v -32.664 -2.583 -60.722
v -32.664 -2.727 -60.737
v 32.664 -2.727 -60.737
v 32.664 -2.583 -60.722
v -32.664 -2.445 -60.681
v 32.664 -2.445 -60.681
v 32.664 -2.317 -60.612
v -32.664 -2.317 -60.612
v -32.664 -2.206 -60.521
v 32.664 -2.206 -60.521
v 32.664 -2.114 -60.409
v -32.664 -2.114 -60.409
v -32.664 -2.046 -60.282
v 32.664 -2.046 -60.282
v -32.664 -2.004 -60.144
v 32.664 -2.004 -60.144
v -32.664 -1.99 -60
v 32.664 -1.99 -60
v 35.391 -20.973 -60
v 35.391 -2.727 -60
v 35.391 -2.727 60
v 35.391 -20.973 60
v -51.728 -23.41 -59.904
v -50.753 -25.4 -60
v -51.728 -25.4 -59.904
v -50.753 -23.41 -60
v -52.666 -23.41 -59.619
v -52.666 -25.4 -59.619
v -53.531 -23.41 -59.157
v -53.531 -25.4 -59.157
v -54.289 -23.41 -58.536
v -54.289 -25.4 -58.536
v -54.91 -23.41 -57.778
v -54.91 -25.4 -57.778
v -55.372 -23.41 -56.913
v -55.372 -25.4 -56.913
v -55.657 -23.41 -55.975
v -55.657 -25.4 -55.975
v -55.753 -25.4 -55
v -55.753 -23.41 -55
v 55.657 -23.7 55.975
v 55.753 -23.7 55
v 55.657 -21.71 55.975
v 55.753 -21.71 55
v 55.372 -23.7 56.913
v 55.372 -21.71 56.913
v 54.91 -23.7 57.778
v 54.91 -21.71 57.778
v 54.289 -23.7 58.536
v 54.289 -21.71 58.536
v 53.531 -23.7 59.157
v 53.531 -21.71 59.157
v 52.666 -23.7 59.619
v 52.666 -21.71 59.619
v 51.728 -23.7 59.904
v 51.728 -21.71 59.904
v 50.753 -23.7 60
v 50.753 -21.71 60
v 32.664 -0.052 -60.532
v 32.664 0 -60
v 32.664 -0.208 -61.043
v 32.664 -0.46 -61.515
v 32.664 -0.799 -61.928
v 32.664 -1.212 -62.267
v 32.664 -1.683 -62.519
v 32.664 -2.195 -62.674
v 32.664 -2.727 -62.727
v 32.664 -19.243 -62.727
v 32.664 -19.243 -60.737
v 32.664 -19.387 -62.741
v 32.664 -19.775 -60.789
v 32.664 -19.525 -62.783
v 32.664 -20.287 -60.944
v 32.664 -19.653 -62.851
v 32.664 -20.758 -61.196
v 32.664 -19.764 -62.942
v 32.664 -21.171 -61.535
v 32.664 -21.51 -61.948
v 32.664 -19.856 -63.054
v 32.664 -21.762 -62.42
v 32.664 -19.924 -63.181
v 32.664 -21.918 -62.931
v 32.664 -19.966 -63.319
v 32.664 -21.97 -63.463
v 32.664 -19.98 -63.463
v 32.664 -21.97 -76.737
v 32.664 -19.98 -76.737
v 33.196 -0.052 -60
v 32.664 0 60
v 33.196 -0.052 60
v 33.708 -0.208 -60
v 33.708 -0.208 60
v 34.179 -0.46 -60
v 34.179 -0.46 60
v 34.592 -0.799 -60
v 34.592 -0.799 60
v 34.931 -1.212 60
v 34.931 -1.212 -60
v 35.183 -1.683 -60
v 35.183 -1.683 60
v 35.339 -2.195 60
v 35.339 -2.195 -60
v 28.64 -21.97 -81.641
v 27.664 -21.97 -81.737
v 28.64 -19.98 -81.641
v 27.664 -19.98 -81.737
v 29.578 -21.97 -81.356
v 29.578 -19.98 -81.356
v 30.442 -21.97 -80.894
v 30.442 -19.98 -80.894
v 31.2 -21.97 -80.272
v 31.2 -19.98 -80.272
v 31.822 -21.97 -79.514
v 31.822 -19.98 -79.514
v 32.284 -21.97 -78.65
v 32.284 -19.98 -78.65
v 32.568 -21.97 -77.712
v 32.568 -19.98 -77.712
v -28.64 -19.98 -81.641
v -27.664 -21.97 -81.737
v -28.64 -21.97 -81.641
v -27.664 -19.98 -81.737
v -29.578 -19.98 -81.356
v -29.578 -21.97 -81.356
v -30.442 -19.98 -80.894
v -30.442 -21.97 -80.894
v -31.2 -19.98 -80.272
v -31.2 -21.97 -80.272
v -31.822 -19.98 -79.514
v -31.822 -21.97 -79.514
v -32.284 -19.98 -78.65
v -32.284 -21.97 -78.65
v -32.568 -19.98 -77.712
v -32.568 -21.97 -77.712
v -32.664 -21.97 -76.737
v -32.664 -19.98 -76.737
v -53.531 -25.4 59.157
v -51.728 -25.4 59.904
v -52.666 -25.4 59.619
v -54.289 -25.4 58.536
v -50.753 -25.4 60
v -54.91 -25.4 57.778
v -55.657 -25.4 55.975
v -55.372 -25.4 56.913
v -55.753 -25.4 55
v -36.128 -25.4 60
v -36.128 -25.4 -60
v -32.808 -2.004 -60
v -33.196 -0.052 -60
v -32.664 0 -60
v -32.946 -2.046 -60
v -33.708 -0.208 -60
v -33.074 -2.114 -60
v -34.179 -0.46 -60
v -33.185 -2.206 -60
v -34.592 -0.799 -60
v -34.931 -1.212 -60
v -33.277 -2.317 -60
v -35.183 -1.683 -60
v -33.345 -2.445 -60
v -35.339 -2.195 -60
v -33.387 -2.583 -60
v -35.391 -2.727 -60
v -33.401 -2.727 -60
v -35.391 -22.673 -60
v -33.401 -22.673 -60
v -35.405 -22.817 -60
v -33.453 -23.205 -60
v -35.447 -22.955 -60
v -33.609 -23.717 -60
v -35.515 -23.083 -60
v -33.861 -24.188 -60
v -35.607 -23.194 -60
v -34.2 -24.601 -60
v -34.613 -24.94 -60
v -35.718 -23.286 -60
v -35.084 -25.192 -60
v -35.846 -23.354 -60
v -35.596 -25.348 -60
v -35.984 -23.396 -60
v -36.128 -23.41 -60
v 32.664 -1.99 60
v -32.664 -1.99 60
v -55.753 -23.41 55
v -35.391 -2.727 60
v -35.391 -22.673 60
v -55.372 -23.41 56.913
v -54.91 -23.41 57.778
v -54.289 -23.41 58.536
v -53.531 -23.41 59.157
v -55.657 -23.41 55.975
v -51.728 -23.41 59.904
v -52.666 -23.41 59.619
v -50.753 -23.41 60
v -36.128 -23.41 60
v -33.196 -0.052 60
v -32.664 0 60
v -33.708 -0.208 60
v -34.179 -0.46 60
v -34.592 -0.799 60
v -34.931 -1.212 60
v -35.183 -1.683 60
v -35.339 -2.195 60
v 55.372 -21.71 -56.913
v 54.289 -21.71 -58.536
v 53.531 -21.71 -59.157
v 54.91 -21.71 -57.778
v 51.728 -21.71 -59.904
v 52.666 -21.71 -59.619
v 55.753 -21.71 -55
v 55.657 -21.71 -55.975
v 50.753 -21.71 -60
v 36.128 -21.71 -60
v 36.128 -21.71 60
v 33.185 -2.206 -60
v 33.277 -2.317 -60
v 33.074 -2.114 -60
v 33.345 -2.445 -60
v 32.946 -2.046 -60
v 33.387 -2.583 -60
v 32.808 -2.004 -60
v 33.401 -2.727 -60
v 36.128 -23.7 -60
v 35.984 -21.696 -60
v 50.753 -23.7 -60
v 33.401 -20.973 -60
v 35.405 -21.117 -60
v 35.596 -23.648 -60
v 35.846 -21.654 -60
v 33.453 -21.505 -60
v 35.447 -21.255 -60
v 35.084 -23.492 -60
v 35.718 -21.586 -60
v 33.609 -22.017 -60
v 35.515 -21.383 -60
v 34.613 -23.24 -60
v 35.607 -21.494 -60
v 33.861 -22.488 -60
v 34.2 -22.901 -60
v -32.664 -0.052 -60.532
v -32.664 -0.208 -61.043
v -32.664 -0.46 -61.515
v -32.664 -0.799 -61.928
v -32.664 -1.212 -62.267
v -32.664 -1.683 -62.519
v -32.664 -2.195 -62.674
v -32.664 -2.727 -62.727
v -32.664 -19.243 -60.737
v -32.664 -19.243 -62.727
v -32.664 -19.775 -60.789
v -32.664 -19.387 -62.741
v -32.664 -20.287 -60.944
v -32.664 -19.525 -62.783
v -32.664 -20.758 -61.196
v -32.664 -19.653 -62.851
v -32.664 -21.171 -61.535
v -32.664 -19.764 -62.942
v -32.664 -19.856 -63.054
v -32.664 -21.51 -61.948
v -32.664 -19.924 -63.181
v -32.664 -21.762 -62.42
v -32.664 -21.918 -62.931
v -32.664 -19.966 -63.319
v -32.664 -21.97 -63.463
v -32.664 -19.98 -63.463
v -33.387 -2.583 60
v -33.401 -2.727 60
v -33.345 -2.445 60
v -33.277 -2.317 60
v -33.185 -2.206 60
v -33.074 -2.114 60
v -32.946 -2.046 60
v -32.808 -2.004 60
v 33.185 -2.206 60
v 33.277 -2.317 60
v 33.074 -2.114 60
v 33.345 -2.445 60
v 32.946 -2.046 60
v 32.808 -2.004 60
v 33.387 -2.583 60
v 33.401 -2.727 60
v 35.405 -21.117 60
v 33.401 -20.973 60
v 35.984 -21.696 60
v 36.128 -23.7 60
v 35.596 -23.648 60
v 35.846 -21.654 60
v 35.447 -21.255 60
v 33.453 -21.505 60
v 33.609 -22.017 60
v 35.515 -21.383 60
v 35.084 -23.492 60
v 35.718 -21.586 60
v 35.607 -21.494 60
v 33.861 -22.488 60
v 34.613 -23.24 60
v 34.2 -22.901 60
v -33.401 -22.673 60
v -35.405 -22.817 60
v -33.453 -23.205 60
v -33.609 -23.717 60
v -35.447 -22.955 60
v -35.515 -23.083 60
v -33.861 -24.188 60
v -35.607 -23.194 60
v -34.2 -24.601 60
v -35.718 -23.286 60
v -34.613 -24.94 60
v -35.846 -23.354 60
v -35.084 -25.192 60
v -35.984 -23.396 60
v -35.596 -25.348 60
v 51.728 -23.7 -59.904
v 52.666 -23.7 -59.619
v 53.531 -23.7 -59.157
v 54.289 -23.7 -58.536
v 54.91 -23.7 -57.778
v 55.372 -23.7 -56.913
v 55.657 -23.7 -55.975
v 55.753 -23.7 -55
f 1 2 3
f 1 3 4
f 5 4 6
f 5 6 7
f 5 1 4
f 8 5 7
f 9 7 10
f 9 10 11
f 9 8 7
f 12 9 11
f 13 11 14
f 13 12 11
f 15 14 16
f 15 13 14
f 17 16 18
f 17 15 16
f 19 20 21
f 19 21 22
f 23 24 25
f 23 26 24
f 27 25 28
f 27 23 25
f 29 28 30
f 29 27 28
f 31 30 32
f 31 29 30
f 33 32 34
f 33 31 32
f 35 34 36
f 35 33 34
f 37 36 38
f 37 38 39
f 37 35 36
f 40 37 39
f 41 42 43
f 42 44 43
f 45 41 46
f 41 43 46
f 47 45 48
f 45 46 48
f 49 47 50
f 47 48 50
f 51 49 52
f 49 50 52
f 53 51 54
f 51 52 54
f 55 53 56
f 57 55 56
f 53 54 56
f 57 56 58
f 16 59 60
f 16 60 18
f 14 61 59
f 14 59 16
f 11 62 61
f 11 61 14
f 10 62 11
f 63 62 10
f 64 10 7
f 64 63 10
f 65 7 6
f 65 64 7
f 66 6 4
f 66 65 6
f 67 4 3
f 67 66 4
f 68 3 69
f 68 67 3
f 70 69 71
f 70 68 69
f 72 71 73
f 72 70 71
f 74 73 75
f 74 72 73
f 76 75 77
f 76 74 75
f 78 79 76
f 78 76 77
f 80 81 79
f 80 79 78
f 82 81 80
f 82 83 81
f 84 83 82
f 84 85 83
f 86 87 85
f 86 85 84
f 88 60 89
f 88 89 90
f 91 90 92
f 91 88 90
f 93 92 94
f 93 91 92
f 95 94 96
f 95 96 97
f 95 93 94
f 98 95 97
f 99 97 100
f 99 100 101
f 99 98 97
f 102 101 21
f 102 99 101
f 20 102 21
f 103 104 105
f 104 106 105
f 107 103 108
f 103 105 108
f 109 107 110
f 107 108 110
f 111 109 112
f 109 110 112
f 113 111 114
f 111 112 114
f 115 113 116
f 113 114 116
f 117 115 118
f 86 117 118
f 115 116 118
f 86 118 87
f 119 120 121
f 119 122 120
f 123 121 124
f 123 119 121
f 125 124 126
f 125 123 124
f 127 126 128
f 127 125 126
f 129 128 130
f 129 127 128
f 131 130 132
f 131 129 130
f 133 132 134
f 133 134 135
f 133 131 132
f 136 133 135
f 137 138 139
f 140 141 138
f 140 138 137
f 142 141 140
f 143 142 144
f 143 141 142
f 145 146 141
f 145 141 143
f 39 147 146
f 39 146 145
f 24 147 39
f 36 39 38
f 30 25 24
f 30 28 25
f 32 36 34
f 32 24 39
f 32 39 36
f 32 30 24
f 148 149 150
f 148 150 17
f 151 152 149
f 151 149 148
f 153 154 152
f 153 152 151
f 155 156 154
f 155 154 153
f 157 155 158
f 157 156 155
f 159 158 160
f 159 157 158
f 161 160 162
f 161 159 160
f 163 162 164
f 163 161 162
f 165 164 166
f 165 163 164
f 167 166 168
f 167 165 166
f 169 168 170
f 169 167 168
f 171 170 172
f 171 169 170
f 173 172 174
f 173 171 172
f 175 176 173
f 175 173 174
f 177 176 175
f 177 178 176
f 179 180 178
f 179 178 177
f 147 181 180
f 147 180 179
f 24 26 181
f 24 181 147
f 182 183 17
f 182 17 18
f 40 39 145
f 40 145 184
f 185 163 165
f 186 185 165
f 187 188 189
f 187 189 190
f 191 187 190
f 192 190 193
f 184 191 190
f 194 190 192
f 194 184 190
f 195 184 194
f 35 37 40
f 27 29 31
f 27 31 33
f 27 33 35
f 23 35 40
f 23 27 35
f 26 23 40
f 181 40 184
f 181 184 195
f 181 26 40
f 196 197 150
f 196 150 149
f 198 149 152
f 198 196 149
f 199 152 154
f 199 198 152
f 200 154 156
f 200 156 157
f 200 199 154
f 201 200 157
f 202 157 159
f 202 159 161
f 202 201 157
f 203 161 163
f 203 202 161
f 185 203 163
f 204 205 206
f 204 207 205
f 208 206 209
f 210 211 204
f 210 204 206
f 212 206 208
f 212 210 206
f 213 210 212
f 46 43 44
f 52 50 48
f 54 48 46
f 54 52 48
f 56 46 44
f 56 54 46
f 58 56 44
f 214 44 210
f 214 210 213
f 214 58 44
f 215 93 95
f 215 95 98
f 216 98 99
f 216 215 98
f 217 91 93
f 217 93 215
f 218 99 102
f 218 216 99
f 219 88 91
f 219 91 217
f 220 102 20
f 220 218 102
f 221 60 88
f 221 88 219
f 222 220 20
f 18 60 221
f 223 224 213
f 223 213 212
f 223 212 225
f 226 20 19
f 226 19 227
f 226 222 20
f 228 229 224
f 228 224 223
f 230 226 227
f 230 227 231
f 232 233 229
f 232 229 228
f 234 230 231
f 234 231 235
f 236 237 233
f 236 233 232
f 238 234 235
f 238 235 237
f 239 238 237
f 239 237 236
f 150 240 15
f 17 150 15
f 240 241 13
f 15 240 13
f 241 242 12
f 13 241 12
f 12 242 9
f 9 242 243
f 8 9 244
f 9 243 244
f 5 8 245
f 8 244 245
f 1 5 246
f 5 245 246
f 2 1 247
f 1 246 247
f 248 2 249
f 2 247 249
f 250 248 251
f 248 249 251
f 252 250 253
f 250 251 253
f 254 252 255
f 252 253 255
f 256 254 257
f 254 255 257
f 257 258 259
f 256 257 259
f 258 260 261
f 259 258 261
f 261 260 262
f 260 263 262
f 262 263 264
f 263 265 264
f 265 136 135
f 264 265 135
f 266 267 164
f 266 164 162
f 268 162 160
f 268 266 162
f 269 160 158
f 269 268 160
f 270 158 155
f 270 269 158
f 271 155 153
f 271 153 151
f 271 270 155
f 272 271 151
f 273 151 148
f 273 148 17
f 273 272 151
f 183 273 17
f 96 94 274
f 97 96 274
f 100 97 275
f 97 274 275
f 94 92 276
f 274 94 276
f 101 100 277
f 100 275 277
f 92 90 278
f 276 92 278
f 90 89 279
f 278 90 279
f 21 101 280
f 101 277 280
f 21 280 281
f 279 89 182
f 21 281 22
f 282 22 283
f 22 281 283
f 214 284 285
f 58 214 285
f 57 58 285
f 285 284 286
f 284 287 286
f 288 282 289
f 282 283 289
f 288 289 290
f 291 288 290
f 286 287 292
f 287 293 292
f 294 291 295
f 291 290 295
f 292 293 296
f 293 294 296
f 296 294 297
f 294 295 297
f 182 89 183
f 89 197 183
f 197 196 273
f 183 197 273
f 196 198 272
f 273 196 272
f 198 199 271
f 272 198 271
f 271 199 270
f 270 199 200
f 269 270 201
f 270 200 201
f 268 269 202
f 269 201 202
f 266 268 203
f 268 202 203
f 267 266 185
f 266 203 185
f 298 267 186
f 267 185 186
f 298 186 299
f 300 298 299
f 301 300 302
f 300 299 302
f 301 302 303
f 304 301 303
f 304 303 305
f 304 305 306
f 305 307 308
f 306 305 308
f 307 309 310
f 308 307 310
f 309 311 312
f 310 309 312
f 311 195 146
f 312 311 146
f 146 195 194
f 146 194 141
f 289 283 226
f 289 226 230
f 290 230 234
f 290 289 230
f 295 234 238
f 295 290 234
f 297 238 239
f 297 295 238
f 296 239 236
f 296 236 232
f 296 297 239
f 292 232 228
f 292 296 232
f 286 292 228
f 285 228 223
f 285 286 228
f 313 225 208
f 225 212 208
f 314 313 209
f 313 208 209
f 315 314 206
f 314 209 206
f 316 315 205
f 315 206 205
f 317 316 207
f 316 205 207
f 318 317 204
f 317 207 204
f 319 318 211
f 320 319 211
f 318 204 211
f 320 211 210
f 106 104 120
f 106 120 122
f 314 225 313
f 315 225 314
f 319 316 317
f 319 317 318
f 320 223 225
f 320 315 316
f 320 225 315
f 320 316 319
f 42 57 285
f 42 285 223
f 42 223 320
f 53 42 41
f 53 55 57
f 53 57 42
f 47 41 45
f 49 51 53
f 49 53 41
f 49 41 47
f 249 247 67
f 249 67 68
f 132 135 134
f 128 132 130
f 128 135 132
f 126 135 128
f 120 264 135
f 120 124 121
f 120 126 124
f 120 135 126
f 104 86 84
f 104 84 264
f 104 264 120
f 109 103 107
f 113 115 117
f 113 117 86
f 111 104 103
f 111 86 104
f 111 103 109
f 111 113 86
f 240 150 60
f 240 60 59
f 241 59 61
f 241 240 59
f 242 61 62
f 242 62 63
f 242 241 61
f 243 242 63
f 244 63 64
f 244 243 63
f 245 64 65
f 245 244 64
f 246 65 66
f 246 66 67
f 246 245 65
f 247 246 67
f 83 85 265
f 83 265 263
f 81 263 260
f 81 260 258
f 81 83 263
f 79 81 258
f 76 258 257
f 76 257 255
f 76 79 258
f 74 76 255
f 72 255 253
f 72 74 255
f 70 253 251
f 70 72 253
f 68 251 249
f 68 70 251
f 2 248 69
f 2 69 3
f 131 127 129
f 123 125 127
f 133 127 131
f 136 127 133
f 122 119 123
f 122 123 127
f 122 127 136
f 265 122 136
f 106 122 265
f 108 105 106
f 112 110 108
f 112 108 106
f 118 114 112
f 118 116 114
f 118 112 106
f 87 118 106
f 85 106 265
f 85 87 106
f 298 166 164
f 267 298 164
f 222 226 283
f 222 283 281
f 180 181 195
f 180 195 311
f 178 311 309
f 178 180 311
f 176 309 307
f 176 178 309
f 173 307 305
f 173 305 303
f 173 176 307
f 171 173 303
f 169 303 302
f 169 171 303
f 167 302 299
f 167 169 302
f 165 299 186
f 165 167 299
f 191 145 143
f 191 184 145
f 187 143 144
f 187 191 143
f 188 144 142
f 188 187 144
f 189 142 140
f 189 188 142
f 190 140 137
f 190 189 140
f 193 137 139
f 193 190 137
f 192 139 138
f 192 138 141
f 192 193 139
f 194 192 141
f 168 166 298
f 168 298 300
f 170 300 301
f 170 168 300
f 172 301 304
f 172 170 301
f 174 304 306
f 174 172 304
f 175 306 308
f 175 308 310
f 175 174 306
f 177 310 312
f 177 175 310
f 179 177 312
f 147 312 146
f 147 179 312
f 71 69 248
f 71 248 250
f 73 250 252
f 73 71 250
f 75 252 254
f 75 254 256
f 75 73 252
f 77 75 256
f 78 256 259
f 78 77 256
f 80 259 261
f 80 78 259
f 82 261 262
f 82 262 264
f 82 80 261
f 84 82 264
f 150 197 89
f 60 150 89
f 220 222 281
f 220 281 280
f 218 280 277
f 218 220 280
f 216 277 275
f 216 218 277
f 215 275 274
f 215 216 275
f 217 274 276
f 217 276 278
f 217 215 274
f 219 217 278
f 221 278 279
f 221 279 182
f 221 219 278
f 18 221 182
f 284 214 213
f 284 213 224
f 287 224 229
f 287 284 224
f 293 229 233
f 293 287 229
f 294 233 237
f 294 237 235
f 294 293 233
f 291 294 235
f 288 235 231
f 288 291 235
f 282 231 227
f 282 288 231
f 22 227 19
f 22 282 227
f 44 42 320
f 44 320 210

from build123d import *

# Parameters (mm, degrees)
SKETCH3_W                    = 66.802
SKETCH3_H                    = 120
BASE_FLANGE1_DEPTH           = 1.99
EDGE_FLANGE1_STRIP_W         = 9.4332
EDGE_FLANGE1_STRIP_H         = 1.99
EDGE_FLANGE1_STRIP_CUT_DEPTH = 120
EDGE_FLANGE1_DEPTH           = 120
EDGE_FLANGE2_STRIP_W         = 9.4332
EDGE_FLANGE2_STRIP_H         = 1.99
EDGE_FLANGE2_STRIP_CUT_DEPTH = 120
EDGE_FLANGE2_DEPTH           = 120
EDGE_FLANGE3_STRIP_W         = 9.4332
EDGE_FLANGE3_STRIP_H         = 1.99
EDGE_FLANGE3_STRIP_CUT_DEPTH = 120
EDGE_FLANGE3_DEPTH           = 120
EDGE_FLANGE4_STRIP_W         = 9.4332
EDGE_FLANGE4_STRIP_H         = 1.99
EDGE_FLANGE4_STRIP_CUT_DEPTH = 120
EDGE_FLANGE4_DEPTH           = 120
EDGE_FLANGE6_DEPTH           = 65.3288
EDGE_FLANGE7_STRIP_W         = 9.4332
EDGE_FLANGE7_STRIP_H         = 1.99
EDGE_FLANGE7_STRIP_CUT_DEPTH = 65.3288
EDGE_FLANGE7_DEPTH           = 65.3288
FILLET1_R                    = 5


# Sheet-metal steps are written as plain solids
with BuildPart() as part:
    # Sketch3 → Base-Flange1 (new body)
    with BuildSketch(Plane(origin=(0, 0, 0), x_dir=(1, 0, 0), z_dir=(0, 1, 0))):
        Rectangle(SKETCH3_W, SKETCH3_H)
    extrude(amount=-BASE_FLANGE1_DEPTH)

    # Edge-Flange1 strip (across the edge) → Edge-Flange1 strip cut (cut)
    with BuildSketch(Plane(origin=(33.401, -1.99, -60), x_dir=(-1, 0, 0), z_dir=(0, 0, 1))):
        with Locations((-3.98, -0.995)):
            Rectangle(EDGE_FLANGE1_STRIP_W, EDGE_FLANGE1_STRIP_H)
    extrude(amount=EDGE_FLANGE1_STRIP_CUT_DEPTH, mode=Mode.SUBTRACT)

    # Edge-Flange1 section (across the edge) → Edge-Flange1 (add)
    with BuildSketch(Plane(origin=(33.401, -1.99, -60), x_dir=(-1, 0, 0), z_dir=(0, 0, 1))):
        with BuildLine():
            Line((-1.99, 0.7366), (-1.99, 21.71))
            Line((-1.99, 21.71), (0, 21.71))
            Line((0, 21.71), (0, 0.7366))
            ThreePointArc((0, 0.7366), (0.215745145, 0.215745145), (0.7366, 0))
            Line((0.7366, 0), (0.7366, -1.99))
            ThreePointArc((0.7366, -1.99), (-1.19139735, -1.19139735), (-1.99, 0.7366))
        make_face()
    extrude(amount=EDGE_FLANGE1_DEPTH)

    # Edge-Flange2 strip (across the edge) → Edge-Flange2 strip cut (cut)
    with BuildSketch(Plane(origin=(-33.401, -1.99, 60), x_dir=(1, 0, 0), z_dir=(0, 0, -1))):
        with Locations((-3.98, -0.995)):
            Rectangle(EDGE_FLANGE2_STRIP_W, EDGE_FLANGE2_STRIP_H)
    extrude(amount=EDGE_FLANGE2_STRIP_CUT_DEPTH, mode=Mode.SUBTRACT)

    # Edge-Flange2 section (across the edge) → Edge-Flange2 (add)
    with BuildSketch(Plane(origin=(-33.401, -1.99, 60), x_dir=(1, 0, 0), z_dir=(0, 0, -1))):
        with BuildLine():
            Line((-1.99, 0.7366), (-1.99, 23.41))
            Line((-1.99, 23.41), (0, 23.41))
            Line((0, 23.41), (0, 0.7366))
            ThreePointArc((0, 0.7366), (0.215745145, 0.215745145), (0.7366, 0))
            Line((0.7366, 0), (0.7366, -1.99))
            ThreePointArc((0.7366, -1.99), (-1.19139735, -1.19139735), (-1.99, 0.7366))
        make_face()
    extrude(amount=EDGE_FLANGE2_DEPTH)

    # Edge-Flange3 strip (across the edge) → Edge-Flange3 strip cut (cut)
    with BuildSketch(Plane(origin=(35.391, -23.7, 60), x_dir=(0, 1, 0), z_dir=(0, 0, -1))):
        with Locations((-1.99, -0.995)):
            Rectangle(EDGE_FLANGE3_STRIP_W, EDGE_FLANGE3_STRIP_H)
    extrude(amount=EDGE_FLANGE3_STRIP_CUT_DEPTH, mode=Mode.SUBTRACT)

    # Edge-Flange3 section (across the edge) → Edge-Flange3 (add)
    with BuildSketch(Plane(origin=(35.391, -23.7, 60), x_dir=(0, 1, 0), z_dir=(0, 0, -1))):
        with BuildLine():
            Line((0, 0.7366), (0, 20.362))
            Line((0, 20.362), (1.99, 20.362))
            Line((1.99, 20.362), (1.99, 0.7366))
            ThreePointArc((1.99, 0.7366), (2.205745145, 0.215745145), (2.7266, 0))
            Line((2.7266, 0), (2.7266, -1.99))
            ThreePointArc((2.7266, -1.99), (0.79860265, -1.19139735), (0, 0.7366))
        make_face()
    extrude(amount=EDGE_FLANGE3_DEPTH)

    # Edge-Flange4 strip (across the edge) → Edge-Flange4 strip cut (cut)
    with BuildSketch(Plane(origin=(-35.391, -25.4, -60), x_dir=(0, 1, 0), z_dir=(0, 0, 1))):
        with Locations((-1.99, -0.995)):
            Rectangle(EDGE_FLANGE4_STRIP_W, EDGE_FLANGE4_STRIP_H)
    extrude(amount=EDGE_FLANGE4_STRIP_CUT_DEPTH, mode=Mode.SUBTRACT)

    # Edge-Flange4 section (across the edge) → Edge-Flange4 (add)
    with BuildSketch(Plane(origin=(-35.391, -25.4, -60), x_dir=(0, 1, 0), z_dir=(0, 0, 1))):
        with BuildLine():
            Line((0, 0.7366), (0, 20.362))
            Line((0, 20.362), (1.99, 20.362))
            Line((1.99, 20.362), (1.99, 0.7366))
            ThreePointArc((1.99, 0.7366), (2.205745145, 0.215745145), (2.7266, 0))
            Line((2.7266, 0), (2.7266, -1.99))
            ThreePointArc((2.7266, -1.99), (0.79860265, -1.19139735), (0, 0.7366))
        make_face()
    extrude(amount=EDGE_FLANGE4_DEPTH)

    # Edge-Flange6 section (across the edge) → Edge-Flange6 (add)
    with BuildSketch(Plane(origin=(-32.6644, -1.99, -60.7366), x_dir=(0, 0, 1), z_dir=(1, 0, 0))):
        with BuildLine():
            Line((-1.99, 0.7366), (-1.99, 17.99))
            Line((-1.99, 17.99), (0, 17.99))
            Line((0, 17.99), (0, 0.7366))
            ThreePointArc((0, 0.7366), (0.215745145, 0.215745145), (0.7366, 0))
            Line((0.7366, 0), (0.7366, -1.99))
            ThreePointArc((0.7366, -1.99), (-1.19139735, -1.19139735), (-1.99, 0.7366))
        make_face()
    extrude(amount=EDGE_FLANGE6_DEPTH)

    # Edge-Flange7 strip (across the edge) → Edge-Flange7 strip cut (cut)
    with BuildSketch(Plane(origin=(32.6644, -19.98, -62.7266), x_dir=(0, 1, 0), z_dir=(-1, 0, 0))):
        with Locations((-3.98, -0.995)):
            Rectangle(EDGE_FLANGE7_STRIP_W, EDGE_FLANGE7_STRIP_H)
    extrude(amount=EDGE_FLANGE7_STRIP_CUT_DEPTH, mode=Mode.SUBTRACT)

    # Edge-Flange7 section (across the edge) → Edge-Flange7 (add)
    with BuildSketch(Plane(origin=(32.6644, -19.98, -62.7266), x_dir=(0, 1, 0), z_dir=(-1, 0, 0))):
        with BuildLine():
            Line((-1.99, 0.7366), (-1.99, 19.01))
            Line((-1.99, 19.01), (0, 19.01))
            Line((0, 19.01), (0, 0.7366))
            ThreePointArc((0, 0.7366), (0.215745145, 0.215745145), (0.7366, 0))
            Line((0.7366, 0), (0.7366, -1.99))
            ThreePointArc((0.7366, -1.99), (-1.19139735, -1.19139735), (-1.99, 0.7366))
        make_face()
    extrude(amount=EDGE_FLANGE7_DEPTH)

    # Fillet1
    fillet1_edges = [part.edges().sort_by_distance(p)[0] for p in [
        (55.753, -22.705, 60),
        (55.753, -22.705, -60),
        (-55.753, -24.405, -60),
        (-55.753, -24.405, 60),
        (32.6644, -20.975, -81.7366),
        (-32.6644, -20.975, -81.7366),
    ]]
    fillet(fillet1_edges, radius=FILLET1_R)


solid = part.part
